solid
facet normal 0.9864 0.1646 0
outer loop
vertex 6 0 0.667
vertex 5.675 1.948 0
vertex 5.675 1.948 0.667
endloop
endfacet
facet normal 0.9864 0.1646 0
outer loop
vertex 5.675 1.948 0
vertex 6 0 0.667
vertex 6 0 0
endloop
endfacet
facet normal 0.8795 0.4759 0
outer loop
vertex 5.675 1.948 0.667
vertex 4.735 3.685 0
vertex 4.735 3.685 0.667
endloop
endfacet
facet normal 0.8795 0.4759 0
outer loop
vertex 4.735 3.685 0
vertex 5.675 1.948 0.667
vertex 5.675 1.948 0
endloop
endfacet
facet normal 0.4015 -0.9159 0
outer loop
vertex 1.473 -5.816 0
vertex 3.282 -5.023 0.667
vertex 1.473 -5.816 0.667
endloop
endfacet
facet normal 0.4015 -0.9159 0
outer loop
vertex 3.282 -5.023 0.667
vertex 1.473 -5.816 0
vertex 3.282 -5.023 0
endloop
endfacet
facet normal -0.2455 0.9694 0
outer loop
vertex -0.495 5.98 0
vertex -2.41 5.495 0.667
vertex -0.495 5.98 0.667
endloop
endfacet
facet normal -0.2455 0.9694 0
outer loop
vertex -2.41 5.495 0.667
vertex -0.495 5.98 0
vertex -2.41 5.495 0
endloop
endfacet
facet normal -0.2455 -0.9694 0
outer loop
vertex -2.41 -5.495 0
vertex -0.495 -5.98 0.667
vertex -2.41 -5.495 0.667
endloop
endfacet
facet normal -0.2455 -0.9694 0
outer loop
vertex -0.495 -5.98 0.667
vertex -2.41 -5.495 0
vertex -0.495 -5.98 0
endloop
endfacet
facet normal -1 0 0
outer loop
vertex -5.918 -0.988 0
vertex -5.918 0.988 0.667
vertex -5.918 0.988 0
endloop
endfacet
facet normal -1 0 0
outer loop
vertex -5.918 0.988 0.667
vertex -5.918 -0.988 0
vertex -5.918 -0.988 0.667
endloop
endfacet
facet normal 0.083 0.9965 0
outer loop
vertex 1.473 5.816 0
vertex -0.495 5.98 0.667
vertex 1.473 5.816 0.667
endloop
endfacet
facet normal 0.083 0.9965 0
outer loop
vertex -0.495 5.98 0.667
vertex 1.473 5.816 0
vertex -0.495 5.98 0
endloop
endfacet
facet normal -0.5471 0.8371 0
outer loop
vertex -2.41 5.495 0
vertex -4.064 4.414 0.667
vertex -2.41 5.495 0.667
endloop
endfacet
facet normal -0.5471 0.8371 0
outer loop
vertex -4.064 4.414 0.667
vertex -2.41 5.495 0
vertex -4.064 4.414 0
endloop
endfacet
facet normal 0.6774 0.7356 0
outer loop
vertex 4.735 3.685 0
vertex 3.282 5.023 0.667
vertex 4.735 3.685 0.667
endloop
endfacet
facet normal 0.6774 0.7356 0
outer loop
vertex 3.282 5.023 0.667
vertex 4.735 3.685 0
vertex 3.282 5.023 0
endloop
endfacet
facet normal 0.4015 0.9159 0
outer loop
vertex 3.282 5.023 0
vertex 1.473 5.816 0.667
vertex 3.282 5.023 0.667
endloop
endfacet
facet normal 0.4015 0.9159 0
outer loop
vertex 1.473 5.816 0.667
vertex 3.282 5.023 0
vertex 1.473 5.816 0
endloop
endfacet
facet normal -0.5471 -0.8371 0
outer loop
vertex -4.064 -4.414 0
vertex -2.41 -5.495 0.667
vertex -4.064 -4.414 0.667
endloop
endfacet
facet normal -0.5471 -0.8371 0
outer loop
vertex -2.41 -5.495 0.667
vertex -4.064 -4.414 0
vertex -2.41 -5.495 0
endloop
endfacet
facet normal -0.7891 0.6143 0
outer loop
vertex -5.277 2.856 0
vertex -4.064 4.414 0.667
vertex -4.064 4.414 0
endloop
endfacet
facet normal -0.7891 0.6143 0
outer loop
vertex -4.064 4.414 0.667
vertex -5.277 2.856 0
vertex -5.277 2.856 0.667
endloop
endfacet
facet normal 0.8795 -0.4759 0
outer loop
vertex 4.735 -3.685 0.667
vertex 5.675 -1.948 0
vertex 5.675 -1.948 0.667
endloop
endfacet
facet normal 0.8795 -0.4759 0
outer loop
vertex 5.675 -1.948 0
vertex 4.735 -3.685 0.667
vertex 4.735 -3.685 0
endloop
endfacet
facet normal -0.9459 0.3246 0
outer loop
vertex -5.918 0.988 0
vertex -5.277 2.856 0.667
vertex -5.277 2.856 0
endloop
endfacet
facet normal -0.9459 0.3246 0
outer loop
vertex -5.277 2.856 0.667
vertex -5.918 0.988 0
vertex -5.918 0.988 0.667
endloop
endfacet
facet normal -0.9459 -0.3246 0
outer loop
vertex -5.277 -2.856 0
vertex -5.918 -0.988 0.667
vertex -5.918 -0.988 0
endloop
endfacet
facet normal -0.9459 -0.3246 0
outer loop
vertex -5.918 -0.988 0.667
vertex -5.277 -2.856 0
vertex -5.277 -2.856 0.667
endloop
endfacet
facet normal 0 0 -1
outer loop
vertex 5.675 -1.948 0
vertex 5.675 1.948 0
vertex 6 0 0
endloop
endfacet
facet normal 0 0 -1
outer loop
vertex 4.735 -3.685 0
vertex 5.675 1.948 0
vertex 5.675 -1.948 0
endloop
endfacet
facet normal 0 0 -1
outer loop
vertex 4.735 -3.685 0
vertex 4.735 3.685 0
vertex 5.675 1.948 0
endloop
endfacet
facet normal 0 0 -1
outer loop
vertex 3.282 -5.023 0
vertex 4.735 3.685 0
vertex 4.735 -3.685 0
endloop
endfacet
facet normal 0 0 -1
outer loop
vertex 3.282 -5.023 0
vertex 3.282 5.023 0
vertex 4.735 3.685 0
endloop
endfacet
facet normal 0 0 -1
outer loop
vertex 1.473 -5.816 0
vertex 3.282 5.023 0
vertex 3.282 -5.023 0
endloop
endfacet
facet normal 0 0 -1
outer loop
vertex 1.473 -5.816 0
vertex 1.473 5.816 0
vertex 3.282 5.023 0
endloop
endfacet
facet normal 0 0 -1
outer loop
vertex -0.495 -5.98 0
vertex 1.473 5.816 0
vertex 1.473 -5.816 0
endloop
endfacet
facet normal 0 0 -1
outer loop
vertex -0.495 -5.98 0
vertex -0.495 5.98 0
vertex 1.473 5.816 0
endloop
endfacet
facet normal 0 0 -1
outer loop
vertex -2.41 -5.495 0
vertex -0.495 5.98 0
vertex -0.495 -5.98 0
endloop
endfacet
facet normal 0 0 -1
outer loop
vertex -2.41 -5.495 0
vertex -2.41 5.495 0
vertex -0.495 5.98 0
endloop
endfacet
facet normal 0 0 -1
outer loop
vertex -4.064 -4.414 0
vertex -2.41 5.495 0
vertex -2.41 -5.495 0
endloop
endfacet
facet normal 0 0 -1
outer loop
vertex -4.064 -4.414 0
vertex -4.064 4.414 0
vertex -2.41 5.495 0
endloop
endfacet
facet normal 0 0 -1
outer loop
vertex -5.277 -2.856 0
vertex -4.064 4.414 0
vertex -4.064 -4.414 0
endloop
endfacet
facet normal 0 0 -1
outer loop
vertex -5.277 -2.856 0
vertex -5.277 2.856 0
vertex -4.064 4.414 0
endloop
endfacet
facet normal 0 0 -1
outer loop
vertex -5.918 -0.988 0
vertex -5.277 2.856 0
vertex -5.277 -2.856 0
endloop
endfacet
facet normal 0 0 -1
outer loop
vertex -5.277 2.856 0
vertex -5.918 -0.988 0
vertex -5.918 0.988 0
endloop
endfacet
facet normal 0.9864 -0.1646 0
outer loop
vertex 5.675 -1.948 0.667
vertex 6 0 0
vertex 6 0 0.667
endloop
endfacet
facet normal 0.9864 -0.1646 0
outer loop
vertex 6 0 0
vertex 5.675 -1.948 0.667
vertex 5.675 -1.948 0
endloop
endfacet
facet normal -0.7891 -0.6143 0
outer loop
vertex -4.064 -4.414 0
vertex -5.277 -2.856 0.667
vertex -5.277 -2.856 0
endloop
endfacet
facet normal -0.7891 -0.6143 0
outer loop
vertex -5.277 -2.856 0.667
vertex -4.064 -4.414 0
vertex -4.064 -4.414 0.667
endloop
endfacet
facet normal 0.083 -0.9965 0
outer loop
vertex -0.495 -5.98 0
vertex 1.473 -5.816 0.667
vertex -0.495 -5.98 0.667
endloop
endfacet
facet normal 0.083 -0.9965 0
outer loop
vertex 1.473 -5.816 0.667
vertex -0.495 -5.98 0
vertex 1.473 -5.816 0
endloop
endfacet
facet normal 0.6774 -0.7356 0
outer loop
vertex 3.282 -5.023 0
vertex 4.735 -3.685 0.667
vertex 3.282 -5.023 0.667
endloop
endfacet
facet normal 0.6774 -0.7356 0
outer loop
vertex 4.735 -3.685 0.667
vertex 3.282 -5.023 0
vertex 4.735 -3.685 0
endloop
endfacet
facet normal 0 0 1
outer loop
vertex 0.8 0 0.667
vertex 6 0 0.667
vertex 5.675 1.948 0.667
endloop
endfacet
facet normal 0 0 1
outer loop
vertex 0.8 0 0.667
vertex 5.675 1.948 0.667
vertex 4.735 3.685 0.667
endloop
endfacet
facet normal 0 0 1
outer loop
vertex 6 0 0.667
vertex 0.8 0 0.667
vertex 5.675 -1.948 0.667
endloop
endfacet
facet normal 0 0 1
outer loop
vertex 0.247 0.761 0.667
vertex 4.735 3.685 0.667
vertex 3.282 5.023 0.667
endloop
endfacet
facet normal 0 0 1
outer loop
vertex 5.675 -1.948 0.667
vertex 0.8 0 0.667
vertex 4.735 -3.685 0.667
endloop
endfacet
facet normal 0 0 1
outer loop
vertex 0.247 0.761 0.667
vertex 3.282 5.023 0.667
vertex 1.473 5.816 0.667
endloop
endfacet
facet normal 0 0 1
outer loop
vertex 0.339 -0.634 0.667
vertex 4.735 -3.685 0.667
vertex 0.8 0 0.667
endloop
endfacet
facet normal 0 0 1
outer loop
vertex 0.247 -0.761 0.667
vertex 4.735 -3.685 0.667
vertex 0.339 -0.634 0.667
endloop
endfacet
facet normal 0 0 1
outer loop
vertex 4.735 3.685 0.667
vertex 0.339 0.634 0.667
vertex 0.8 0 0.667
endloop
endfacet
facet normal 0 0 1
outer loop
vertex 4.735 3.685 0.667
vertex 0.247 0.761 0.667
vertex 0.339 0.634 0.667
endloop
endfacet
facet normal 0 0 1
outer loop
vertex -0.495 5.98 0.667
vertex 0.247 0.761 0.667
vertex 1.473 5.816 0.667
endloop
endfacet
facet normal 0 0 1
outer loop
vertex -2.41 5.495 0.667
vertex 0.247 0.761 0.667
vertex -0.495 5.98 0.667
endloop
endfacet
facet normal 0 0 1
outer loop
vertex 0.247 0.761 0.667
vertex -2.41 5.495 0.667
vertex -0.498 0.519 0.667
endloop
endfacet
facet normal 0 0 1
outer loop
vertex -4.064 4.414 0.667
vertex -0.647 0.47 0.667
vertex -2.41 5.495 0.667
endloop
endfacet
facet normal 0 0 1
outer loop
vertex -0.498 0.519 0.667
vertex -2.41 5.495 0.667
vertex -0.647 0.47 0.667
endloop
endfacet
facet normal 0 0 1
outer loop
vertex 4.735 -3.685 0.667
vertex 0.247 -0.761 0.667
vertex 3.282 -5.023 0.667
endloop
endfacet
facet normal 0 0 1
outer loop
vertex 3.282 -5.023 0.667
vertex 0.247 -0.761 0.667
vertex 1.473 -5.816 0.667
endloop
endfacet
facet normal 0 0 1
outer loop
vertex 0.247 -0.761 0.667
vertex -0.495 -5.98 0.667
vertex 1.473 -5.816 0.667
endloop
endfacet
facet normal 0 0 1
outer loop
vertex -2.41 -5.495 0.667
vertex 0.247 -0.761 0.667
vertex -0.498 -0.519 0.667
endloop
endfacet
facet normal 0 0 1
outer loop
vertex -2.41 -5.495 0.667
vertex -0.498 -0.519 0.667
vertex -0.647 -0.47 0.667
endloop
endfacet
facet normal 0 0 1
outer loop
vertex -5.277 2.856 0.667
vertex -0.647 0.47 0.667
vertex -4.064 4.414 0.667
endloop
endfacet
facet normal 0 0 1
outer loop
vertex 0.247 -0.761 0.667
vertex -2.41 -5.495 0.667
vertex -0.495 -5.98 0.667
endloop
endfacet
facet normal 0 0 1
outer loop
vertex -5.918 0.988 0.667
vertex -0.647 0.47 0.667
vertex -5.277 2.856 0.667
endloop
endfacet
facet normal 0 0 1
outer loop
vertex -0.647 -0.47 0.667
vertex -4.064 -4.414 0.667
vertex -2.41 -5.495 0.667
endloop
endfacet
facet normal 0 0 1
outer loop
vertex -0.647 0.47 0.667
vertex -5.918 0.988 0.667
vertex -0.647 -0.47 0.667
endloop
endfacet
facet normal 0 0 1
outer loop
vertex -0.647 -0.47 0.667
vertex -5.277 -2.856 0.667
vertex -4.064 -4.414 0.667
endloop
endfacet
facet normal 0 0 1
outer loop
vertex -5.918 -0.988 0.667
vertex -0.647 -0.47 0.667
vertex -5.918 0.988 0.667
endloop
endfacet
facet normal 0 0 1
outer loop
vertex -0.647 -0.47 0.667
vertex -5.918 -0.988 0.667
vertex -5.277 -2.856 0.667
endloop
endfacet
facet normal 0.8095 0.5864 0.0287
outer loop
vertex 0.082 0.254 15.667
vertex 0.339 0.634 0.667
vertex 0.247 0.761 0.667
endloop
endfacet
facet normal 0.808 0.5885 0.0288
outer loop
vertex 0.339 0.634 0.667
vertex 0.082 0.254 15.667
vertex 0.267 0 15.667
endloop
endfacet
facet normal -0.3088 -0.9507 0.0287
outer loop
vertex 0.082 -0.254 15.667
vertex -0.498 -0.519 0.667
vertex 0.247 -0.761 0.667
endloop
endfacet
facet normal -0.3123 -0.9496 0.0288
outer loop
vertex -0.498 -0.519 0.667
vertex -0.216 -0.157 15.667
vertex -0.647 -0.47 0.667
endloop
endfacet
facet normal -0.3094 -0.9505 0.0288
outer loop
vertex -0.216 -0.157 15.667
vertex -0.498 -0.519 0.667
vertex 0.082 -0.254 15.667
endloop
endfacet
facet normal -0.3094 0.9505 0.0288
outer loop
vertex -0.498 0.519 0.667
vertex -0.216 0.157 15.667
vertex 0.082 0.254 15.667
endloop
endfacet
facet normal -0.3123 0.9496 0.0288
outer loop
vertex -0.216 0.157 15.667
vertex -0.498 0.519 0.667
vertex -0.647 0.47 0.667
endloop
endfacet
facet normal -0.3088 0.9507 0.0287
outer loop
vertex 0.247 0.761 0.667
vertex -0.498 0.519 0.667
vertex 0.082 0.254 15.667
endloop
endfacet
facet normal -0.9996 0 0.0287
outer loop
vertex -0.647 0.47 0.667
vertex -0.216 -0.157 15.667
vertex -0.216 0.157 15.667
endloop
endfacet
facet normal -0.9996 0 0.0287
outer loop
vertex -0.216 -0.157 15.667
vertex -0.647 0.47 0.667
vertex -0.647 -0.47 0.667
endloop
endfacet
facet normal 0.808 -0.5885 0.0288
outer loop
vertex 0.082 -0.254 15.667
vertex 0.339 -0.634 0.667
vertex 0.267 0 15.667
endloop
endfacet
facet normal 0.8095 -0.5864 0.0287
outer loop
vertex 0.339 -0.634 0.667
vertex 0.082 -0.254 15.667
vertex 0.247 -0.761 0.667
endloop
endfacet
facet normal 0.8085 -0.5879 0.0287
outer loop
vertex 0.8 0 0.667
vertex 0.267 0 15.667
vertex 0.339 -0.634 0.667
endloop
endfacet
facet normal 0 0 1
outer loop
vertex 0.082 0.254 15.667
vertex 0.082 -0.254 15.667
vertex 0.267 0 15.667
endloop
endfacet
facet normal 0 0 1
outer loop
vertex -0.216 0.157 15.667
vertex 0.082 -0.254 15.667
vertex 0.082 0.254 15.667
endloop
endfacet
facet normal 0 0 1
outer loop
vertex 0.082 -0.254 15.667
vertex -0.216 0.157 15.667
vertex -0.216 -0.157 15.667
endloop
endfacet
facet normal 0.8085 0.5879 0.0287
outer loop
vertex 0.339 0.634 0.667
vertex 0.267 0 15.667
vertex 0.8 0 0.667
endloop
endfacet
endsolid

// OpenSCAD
wallThick = 2;
cutterMinimum = 0.4;
baseHeight = 2;
height = 15;
flangeWidth = 6;

minkowski(){
outline();
cylinder(r1 = wallThick/3, r2 = cutterMinimum/3, h = height);
};
//%cube([.5, .5, height*3], true);

flange();

module flange(){
	difference(){
	minkowski(){
	baseShape(baseHeight/3);
	cylinder(r = flangeWidth, h = baseHeight/3);
	}
	translate([0,0,-0.01])baseShape(baseHeight*1.1);
	};
}



module outline(){
	difference(){
	minkowski(){
	baseShape(baseHeight/3);
	cylinder(r = cutterMinimum/3, h = baseHeight/3);
	}
	translate([0,0,-0.01])baseShape(baseHeight*1.1);
	};
};

module baseShape(H){
linear_extrude(file = "AKK.dxf", height=H);
}
